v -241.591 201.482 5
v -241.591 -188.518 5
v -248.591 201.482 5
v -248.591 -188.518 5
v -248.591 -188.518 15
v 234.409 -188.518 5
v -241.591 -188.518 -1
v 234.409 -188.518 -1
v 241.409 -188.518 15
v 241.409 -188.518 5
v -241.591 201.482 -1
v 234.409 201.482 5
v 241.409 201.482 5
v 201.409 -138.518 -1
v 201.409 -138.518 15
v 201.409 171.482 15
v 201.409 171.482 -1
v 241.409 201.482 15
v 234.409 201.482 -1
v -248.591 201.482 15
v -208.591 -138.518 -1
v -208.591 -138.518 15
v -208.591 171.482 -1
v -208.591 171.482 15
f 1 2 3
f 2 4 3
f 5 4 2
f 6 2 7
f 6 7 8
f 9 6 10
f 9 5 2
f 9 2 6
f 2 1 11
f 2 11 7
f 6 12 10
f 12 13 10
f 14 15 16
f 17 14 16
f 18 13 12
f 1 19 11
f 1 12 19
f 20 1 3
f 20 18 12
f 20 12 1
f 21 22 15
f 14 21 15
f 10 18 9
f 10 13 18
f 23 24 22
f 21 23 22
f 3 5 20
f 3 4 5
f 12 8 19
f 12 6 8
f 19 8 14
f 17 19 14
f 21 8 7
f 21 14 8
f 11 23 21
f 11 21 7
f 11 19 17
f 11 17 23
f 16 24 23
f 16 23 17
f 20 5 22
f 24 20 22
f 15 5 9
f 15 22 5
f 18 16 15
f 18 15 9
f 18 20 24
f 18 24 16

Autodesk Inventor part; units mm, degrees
ref_plane "YZ Plane" through (0, 0, 0) normal (1, 0, 0) x (0, 1, 0)
ref_plane "XZ Plane" through (0, 0, 0) normal (0, 1, 0) x (-1, 0, 0)
ref_plane "XY Plane" through (0, 0, 0) normal (0, 0, 1) x (1, 0, 0)
sketch "Sketch1" plane through (0, 0, 0) normal (0, 0, 1) x (1, 0, 0)
  line L0 (-208.5912, 171.4818) -> (201.4088, 171.4818)
  line L1 (201.4088, 171.4818) -> (201.4088, -138.5182)
  line L2 (201.4088, -138.5182) -> (-208.5912, -138.5182)
  line L3 (-208.5912, -138.5182) -> (-208.5912, 171.4818)
  line L4 (-248.5912, 201.4818) -> (241.4088, 201.4818)
  line L5 (241.4088, 201.4818) -> (241.4088, -188.5182)
  line L6 (241.4088, -188.5182) -> (-248.5912, -188.5182)
  line L7 (-248.5912, -188.5182) -> (-248.5912, 201.4818)
  point P0 (0, 0)
  dimension "d0" = 410
  dimension "d1" = 310
  dimension "d2" = 490
  dimension "d3" = 40
  dimension "d4" = 390
  dimension "d5" = 50
extrude "Extrusion1" add sketch "Sketch1" along normal blind 15
sketch "Sketch2" plane through (241.4088, -188.5182, 0) normal (1, 0, 0) x (0, 0, -1)
  line L0 (0, 390) -> (-15, 390) projected
  line L1 (0, 390) -> (-5, 390)
  line L2 (-5, 390) -> (-5, 0)
  line L3 (-5, 0) -> (0, 0)
  line L4 (0, 0) -> (0, 390)
  point P0 (0, 188.5182)
  dimension "d8" = 5
  dimension "d9" = 390
extrude "Extrusion2" cut sketch "Sketch2" against normal blind 7
sketch "Sketch3" plane through (-248.5912, -188.5182, 0) normal (-1, 0, 0) x (0, 0, 1)
  line L0 (0, 390) -> (0, 0) projected
  line L1 (5, 0) -> (5, 390) projected
  line L2 (0, 390) -> (5, 390)
  line L3 (5, 390) -> (5, 0)
  line L4 (5, 0) -> (0, 0)
  line L5 (0, 0) -> (0, 390)
  point P0 (0, 188.5182)
  point P1 (0, 0)
  dimension "d12" = 5
  dimension "d13" = 390
extrude "Extrusion3" cut sketch "Sketch3" against normal blind 7
sketch "Sketch4" plane through (0, 0, 0) normal (0, 0, -1) x (-1, 0, 0)
  line L0 (-234.4088, 201.4818) -> (241.5912, 201.4818) projected
  line L1 (-234.4088, 201.4818) -> (241.5912, 201.4818)
  line L2 (241.5912, 201.4818) -> (241.5912, -188.5182)
  line L3 (241.5912, -188.5182) -> (-234.4088, -188.5182)
  line L4 (-234.4088, -188.5182) -> (-234.4088, 201.4818)
  line L5 (208.5912, 171.4818) -> (-201.4088, 171.4818) projected
  line L6 (-201.4088, 171.4818) -> (208.5912, 171.4818)
  line L7 (208.5912, 171.4818) -> (208.5912, -138.5182)
  line L8 (208.5912, -138.5182) -> (-201.4088, -138.5182)
  line L9 (-201.4088, -138.5182) -> (-201.4088, 171.4818)
  point P0 (0, 0)
extrude "Extrusion4" add sketch "Sketch4" along normal blind 1
properties part number "Arcade_Front"
